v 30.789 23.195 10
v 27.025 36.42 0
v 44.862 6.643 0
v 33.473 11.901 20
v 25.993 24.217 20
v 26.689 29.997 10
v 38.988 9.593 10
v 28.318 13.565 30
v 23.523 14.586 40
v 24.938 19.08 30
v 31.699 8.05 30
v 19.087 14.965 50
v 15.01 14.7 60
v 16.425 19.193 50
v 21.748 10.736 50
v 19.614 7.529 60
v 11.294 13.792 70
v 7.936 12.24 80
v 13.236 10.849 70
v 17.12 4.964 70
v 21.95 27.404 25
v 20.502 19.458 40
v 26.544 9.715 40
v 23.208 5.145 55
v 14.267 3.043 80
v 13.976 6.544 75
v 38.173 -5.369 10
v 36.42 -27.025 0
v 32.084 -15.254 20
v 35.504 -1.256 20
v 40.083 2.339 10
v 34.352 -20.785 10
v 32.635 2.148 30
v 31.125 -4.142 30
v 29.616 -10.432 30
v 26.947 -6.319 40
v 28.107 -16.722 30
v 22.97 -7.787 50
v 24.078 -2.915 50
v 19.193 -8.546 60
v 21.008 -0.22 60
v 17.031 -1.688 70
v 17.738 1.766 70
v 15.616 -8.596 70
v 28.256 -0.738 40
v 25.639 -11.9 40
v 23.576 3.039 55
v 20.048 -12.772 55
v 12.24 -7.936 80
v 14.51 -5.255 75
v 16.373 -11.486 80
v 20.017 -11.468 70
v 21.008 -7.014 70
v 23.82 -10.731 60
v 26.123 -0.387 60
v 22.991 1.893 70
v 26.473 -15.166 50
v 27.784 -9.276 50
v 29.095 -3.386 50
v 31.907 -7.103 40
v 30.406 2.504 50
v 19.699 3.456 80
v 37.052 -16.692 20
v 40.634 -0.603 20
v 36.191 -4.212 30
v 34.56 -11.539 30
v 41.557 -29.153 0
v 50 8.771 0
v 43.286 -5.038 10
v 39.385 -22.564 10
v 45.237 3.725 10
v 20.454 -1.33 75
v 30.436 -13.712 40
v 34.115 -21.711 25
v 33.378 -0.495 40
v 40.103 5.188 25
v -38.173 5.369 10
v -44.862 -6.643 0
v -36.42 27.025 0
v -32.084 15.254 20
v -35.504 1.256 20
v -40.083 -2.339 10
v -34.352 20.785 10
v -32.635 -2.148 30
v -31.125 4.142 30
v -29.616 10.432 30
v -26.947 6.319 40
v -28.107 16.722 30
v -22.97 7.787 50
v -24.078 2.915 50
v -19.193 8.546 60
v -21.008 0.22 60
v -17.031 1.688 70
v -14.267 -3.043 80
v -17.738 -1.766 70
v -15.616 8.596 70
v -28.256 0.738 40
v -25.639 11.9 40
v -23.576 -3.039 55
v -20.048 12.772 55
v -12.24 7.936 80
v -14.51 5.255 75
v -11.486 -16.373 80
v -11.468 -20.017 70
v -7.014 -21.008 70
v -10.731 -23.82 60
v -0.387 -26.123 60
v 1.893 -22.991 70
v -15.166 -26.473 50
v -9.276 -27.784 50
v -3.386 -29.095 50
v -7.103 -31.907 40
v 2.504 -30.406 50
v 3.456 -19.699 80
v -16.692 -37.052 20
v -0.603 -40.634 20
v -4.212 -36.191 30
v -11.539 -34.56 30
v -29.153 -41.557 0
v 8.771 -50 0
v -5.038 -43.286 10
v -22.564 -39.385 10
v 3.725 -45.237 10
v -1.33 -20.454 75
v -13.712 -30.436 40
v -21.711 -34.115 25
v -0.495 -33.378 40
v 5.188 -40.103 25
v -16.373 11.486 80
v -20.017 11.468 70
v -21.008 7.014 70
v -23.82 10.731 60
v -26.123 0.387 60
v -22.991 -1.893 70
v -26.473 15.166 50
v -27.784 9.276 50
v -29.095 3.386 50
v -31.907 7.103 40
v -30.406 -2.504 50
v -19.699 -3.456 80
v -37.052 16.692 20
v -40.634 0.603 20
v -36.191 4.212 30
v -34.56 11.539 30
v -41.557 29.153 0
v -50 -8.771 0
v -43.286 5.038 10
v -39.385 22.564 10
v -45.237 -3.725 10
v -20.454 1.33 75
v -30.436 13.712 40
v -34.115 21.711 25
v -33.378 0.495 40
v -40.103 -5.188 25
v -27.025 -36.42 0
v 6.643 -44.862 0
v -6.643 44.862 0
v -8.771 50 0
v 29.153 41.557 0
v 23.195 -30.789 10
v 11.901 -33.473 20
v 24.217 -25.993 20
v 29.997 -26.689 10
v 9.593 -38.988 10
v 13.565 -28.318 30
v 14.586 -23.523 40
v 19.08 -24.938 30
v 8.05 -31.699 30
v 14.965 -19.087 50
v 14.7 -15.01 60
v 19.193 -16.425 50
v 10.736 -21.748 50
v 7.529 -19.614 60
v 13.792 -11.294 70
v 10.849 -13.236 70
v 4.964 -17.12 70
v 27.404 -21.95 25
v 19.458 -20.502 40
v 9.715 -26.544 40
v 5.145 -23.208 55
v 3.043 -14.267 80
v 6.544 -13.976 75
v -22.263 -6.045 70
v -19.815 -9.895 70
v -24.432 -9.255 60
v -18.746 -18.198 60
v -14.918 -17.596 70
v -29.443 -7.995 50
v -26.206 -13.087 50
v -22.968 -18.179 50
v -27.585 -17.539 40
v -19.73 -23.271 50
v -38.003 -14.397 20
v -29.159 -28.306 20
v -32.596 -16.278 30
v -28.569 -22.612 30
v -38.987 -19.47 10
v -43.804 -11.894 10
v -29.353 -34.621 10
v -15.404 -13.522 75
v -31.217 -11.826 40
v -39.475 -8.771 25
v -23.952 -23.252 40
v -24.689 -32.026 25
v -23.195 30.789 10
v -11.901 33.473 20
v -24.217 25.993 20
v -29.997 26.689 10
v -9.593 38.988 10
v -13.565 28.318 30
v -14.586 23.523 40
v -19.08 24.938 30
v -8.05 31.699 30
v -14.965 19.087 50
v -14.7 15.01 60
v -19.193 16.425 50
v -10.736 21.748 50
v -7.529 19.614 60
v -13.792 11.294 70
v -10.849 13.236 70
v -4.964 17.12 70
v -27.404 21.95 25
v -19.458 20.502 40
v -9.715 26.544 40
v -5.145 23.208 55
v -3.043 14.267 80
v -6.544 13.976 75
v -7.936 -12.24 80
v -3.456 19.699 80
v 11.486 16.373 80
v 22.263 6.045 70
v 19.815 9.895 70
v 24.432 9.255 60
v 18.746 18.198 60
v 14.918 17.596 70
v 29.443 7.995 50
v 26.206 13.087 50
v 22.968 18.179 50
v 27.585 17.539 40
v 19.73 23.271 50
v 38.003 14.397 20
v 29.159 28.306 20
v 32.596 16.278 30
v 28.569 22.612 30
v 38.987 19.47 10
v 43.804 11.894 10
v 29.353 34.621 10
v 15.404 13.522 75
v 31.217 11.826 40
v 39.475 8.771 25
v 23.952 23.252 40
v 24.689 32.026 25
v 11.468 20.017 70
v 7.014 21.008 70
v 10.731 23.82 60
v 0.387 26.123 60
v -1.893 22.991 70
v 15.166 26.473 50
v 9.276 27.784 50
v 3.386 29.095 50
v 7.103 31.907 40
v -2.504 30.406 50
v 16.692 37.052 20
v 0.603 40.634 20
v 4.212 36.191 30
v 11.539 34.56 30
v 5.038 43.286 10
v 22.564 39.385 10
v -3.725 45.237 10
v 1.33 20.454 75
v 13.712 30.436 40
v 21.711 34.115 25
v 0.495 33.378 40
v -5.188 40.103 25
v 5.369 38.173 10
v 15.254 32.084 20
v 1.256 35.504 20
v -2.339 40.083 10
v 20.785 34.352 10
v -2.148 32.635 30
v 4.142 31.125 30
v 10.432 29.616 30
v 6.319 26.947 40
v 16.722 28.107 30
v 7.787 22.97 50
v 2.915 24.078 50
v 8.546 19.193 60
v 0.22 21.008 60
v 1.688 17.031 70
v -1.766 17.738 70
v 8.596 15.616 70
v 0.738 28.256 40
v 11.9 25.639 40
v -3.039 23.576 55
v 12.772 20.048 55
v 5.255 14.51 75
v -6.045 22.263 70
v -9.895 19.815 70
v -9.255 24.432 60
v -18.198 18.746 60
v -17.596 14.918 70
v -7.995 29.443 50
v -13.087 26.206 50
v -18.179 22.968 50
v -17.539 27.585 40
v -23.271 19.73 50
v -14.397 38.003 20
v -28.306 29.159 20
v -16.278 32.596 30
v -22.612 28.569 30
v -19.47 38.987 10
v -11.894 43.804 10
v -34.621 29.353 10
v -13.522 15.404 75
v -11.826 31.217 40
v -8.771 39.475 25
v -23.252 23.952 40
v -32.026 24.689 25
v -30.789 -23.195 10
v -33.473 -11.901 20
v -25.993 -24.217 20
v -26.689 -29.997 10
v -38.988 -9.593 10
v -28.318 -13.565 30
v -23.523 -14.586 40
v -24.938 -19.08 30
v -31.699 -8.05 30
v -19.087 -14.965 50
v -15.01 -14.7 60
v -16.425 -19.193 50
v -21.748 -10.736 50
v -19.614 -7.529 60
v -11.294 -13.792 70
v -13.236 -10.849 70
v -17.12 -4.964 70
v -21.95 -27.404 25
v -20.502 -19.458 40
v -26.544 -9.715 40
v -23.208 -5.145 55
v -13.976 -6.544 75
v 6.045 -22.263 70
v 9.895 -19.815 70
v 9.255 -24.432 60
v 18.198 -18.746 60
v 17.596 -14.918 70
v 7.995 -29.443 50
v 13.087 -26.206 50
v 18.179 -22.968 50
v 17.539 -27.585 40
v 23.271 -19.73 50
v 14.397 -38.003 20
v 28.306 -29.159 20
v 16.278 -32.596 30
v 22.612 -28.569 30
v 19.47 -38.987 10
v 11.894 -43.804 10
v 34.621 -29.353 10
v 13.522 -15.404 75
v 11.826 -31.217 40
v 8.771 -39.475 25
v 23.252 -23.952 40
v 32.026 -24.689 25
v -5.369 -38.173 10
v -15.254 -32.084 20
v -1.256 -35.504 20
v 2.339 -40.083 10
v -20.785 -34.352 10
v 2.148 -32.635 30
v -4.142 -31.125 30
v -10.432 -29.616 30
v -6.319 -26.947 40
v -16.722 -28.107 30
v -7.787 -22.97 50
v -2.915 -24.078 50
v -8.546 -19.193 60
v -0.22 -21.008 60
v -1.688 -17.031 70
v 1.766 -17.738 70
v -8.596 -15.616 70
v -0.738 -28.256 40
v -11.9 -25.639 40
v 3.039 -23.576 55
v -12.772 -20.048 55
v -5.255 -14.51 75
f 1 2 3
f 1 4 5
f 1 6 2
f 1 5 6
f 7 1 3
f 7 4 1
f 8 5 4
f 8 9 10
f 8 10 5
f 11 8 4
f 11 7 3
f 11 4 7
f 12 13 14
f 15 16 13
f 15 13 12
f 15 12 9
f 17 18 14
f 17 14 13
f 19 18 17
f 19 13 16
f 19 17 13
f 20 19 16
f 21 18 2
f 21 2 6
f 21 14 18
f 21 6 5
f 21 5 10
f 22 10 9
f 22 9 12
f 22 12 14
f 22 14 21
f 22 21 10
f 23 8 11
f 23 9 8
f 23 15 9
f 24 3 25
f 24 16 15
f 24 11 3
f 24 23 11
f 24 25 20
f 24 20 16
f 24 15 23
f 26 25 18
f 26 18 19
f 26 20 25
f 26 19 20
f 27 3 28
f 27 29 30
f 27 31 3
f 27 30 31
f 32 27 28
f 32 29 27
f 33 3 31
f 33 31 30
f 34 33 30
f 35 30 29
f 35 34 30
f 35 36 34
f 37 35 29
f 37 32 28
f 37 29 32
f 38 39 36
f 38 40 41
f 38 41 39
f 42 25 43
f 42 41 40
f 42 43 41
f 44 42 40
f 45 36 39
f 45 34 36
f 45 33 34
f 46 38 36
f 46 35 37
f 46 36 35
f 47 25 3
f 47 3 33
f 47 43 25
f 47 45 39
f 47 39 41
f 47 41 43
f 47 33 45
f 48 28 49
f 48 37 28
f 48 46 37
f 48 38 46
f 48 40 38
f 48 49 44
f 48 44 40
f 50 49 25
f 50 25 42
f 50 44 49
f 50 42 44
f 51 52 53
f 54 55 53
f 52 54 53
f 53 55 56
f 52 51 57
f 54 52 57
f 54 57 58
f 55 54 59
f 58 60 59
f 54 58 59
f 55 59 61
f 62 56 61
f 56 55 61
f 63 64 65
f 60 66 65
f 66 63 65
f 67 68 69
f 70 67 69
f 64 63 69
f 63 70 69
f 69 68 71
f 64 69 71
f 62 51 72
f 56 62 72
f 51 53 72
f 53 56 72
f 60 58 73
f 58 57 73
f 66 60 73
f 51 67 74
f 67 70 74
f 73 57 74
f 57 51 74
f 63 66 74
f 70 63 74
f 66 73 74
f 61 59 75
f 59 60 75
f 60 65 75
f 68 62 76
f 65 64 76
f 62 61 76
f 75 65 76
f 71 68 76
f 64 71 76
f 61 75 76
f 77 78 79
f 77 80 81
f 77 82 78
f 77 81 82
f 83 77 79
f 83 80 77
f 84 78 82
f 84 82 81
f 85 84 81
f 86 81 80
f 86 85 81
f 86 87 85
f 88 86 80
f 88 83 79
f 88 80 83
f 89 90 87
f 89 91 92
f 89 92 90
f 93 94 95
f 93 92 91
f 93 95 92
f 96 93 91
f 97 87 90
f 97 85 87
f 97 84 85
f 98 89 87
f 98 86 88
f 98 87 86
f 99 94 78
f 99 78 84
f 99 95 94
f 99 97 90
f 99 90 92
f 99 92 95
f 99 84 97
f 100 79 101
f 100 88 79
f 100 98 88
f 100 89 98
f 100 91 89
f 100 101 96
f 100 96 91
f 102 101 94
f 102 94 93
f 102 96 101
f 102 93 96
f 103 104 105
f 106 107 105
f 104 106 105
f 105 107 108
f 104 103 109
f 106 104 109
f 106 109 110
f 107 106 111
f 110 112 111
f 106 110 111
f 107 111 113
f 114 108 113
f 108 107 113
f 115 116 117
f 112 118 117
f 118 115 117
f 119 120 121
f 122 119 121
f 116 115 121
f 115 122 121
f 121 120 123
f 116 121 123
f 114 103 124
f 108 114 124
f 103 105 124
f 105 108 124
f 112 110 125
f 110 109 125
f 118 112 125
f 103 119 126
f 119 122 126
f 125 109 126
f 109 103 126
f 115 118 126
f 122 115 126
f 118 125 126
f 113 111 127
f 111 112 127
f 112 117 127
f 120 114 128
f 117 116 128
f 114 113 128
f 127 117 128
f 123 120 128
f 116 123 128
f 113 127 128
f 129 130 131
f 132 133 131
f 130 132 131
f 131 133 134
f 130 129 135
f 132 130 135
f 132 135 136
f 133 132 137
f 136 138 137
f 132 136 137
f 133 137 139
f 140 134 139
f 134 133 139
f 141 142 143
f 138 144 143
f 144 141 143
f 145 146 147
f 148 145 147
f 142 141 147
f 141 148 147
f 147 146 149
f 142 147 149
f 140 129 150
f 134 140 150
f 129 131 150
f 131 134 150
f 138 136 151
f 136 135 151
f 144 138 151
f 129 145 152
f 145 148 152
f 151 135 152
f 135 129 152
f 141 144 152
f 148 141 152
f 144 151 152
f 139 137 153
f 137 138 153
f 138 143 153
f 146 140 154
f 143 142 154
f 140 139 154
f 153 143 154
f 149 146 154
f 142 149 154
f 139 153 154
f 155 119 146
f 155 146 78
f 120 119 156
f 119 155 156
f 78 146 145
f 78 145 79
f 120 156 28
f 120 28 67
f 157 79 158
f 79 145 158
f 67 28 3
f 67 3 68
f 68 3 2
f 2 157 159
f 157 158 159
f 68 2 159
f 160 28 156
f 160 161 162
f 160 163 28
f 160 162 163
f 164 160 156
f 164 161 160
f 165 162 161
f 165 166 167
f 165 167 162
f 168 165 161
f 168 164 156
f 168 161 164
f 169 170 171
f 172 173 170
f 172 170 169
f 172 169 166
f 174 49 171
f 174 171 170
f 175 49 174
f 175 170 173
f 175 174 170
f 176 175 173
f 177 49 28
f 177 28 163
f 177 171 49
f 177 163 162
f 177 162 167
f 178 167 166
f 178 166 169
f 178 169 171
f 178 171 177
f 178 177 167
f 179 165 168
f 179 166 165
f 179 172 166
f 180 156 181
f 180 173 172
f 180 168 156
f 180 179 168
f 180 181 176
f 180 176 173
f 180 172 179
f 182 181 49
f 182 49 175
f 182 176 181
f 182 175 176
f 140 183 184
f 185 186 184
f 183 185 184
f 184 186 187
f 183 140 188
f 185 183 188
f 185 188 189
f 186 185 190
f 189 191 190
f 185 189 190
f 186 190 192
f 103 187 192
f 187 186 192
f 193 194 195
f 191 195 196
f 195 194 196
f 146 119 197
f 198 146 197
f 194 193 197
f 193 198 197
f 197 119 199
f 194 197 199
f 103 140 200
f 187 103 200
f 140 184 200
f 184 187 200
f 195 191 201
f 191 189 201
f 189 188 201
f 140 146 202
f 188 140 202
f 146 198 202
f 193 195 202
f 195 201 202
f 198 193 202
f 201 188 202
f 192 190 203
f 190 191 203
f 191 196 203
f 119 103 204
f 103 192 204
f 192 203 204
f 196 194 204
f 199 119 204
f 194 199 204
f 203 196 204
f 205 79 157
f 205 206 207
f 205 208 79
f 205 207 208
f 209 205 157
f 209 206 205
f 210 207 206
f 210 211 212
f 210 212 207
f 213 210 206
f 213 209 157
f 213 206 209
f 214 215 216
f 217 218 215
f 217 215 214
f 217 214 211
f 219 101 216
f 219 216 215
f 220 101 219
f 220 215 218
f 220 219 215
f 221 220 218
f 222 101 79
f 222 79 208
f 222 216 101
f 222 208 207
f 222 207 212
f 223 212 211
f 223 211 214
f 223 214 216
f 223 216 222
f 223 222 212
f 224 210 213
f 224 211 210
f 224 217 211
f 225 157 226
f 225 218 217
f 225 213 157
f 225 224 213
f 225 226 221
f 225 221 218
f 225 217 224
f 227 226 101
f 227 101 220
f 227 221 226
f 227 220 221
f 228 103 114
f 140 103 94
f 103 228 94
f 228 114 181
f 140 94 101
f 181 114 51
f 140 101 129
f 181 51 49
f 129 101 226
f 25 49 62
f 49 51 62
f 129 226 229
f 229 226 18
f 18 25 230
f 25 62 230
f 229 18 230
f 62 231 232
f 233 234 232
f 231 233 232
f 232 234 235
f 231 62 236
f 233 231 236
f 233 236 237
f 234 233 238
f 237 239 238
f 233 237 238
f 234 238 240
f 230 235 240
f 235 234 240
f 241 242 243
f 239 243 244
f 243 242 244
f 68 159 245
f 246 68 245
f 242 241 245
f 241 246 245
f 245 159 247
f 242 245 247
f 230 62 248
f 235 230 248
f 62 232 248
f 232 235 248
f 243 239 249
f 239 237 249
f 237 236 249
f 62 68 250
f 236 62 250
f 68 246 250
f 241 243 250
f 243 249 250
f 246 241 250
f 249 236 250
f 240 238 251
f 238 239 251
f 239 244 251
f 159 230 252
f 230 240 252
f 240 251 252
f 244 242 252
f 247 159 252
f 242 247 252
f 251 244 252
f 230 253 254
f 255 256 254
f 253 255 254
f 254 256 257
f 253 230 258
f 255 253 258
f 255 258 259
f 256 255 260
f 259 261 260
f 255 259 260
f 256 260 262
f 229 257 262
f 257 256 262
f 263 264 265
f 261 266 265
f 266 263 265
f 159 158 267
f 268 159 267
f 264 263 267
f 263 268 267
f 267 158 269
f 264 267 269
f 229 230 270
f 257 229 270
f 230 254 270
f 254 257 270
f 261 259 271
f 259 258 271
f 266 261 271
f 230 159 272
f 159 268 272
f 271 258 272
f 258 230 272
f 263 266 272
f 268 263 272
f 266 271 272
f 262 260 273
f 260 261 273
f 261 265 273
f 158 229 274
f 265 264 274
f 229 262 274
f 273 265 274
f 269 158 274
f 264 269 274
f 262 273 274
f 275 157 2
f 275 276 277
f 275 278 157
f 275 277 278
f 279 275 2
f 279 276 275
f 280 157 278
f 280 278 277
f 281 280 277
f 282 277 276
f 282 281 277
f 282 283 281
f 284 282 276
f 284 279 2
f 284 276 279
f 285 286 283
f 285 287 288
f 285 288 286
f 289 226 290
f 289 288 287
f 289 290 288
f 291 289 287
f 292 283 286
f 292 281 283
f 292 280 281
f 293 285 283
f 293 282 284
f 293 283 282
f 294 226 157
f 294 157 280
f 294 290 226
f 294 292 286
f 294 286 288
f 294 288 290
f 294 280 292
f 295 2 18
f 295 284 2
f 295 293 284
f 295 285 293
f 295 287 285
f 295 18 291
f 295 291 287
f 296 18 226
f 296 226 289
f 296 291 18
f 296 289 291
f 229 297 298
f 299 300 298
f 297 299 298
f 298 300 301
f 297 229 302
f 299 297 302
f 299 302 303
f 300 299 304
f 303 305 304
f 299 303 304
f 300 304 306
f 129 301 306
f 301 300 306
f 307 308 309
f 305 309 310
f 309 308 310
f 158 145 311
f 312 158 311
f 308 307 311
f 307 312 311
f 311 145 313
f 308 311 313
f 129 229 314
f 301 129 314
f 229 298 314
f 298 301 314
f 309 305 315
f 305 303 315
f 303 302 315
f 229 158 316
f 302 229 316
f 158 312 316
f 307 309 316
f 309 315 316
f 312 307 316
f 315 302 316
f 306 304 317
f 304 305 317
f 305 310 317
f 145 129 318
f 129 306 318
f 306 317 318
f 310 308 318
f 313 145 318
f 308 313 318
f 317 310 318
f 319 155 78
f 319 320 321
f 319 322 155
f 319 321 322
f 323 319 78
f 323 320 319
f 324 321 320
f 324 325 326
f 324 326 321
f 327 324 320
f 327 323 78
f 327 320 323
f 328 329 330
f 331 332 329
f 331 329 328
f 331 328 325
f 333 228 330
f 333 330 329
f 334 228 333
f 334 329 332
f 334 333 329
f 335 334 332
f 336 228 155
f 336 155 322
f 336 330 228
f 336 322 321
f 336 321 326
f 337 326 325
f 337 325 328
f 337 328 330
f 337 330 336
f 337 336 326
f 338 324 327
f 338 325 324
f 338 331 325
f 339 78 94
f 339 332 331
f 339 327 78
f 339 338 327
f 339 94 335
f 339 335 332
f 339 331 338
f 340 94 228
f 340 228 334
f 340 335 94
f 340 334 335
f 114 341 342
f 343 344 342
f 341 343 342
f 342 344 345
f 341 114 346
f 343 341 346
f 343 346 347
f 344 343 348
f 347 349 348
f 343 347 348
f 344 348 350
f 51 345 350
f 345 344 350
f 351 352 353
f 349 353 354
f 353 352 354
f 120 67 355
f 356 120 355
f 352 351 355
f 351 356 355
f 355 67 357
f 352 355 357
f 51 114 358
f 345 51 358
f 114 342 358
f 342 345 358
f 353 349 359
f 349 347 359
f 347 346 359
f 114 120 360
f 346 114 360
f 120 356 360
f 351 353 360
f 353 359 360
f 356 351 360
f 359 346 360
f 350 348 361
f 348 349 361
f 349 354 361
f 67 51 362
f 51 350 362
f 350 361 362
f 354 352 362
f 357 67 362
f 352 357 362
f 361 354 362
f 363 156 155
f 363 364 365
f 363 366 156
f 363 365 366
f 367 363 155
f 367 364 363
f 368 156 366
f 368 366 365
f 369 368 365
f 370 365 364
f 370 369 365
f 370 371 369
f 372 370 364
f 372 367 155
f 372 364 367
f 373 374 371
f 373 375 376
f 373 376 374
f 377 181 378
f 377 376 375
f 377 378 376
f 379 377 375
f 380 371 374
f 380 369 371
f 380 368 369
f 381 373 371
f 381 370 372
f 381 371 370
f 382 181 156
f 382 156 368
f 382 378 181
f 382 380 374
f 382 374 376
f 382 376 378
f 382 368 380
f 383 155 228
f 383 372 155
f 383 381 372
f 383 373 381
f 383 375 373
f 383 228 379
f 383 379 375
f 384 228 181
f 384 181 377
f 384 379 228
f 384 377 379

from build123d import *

# Parameters (mm, degrees)
F1_DEPTH = 80


with BuildPart() as f1:
    # F0 (on Top) → F1 (new body)
    with BuildSketch(Plane.XY):
        Polygon((5.8453632716, -35.2880286434), (29.0857003563, -20.8191083406), (35.2880286434, 5.8453632716), (20.8191083406, 29.0857003563), (-5.8453632716, 35.2880286434), (-29.0857003563, 20.8191083406), (-35.2880286434, -5.8453632716), (-20.8191083406, -29.0857003563), align=None)
        Polygon((29.0857003563, -20.8191083406), (41.557197225, -29.1534808936), (50, 8.7707519298), (35.2880286434, 5.8453632716), align=None)
        Polygon((35.2880286434, 5.8453632716), (50, 8.7707519298), (29.1534808936, 41.557197225), (20.8191083406, 29.0857003563), align=None)
        Polygon((20.8191083406, 29.0857003563), (29.1534808936, 41.557197225), (-8.7707519298, 50), (-5.8453632716, 35.2880286434), align=None)
        Polygon((-5.8453632716, 35.2880286434), (-8.7707519298, 50), (-41.557197225, 29.1534808936), (-29.0857003563, 20.8191083406), align=None)
        Polygon((-41.557197225, 29.1534808936), (-50, -8.7707519298), (-35.2880286434, -5.8453632716), (-29.0857003563, 20.8191083406), align=None)
        Polygon((-50, -8.7707519298), (-29.1534808936, -41.557197225), (-20.8191083406, -29.0857003563), (-35.2880286434, -5.8453632716), align=None)
        Polygon((-29.1534808936, -41.557197225), (8.7707519298, -50), (5.8453632716, -35.2880286434), (-20.8191083406, -29.0857003563), align=None)
        Polygon((8.7707519298, -50), (41.557197225, -29.1534808936), (29.0857003563, -20.8191083406), (5.8453632716, -35.2880286434), align=None)
    extrude(amount=F1_DEPTH)

    # F2 (on face) → F3 section 0
    with BuildSketch(Plane.XY.offset(80)):
        Polygon((3.4555393442, -19.6992194729), (16.3728869763, -11.4860163705), (19.6992194729, 3.4555393442), (11.4860163705, 16.3728869763), (-3.4555393442, 19.6992194729), (-16.3728869763, 11.4860163705), (-19.6992194729, -3.4555393442), (-11.4860163705, -16.3728869763), align=None)
    # F1_face1 (on face) → F3 section 1
    with BuildSketch(Plane(origin=(0, 0, 0), x_dir=(1, 0, 0), z_dir=(0, 0, -1))):
        Polygon((50, -8.7707519298), (41.557197225, 29.1534808936), (8.7707519298, 50), (-29.1534808936, 41.557197225), (-50, 8.7707519298), (-41.557197225, -29.1534808936), (-8.7707519298, -50), (29.1534808936, -41.557197225), align=None)
    loft(mode=Mode.INTERSECT)

    # F5 (on face) → F6 section 0
    with BuildSketch(Plane(origin=(0, 0, 0), x_dir=(1, 0, 0), z_dir=(0, 0, -1))):
        Polygon((-6.6426697767, -44.8623552041), (27.0253987405, -36.4195524291), (44.8623552041, -6.6426697767), (36.4195524291, 27.0253987405), (6.6426697767, 44.8623552041), (-27.0253987405, 36.4195524291), (-44.8623552041, 6.6426697767), (-36.4195524291, -27.0253987405), align=None)
    # F4 (on face) → F6 section 1
    with BuildSketch(Plane.XY.offset(80)):
        Polygon((3.0433167547, -14.2670636416), (12.2402873631, -7.9363875341), (14.2670636416, 3.0433167547), (7.9363875341, 12.2402873631), (-3.0433167547, 14.2670636416), (-12.2402873631, 7.9363875341), (-14.2670636416, -3.0433167547), (-7.9363875341, -12.2402873631), align=None)
    loft(mode=Mode.SUBTRACT)


solid = f1.part
